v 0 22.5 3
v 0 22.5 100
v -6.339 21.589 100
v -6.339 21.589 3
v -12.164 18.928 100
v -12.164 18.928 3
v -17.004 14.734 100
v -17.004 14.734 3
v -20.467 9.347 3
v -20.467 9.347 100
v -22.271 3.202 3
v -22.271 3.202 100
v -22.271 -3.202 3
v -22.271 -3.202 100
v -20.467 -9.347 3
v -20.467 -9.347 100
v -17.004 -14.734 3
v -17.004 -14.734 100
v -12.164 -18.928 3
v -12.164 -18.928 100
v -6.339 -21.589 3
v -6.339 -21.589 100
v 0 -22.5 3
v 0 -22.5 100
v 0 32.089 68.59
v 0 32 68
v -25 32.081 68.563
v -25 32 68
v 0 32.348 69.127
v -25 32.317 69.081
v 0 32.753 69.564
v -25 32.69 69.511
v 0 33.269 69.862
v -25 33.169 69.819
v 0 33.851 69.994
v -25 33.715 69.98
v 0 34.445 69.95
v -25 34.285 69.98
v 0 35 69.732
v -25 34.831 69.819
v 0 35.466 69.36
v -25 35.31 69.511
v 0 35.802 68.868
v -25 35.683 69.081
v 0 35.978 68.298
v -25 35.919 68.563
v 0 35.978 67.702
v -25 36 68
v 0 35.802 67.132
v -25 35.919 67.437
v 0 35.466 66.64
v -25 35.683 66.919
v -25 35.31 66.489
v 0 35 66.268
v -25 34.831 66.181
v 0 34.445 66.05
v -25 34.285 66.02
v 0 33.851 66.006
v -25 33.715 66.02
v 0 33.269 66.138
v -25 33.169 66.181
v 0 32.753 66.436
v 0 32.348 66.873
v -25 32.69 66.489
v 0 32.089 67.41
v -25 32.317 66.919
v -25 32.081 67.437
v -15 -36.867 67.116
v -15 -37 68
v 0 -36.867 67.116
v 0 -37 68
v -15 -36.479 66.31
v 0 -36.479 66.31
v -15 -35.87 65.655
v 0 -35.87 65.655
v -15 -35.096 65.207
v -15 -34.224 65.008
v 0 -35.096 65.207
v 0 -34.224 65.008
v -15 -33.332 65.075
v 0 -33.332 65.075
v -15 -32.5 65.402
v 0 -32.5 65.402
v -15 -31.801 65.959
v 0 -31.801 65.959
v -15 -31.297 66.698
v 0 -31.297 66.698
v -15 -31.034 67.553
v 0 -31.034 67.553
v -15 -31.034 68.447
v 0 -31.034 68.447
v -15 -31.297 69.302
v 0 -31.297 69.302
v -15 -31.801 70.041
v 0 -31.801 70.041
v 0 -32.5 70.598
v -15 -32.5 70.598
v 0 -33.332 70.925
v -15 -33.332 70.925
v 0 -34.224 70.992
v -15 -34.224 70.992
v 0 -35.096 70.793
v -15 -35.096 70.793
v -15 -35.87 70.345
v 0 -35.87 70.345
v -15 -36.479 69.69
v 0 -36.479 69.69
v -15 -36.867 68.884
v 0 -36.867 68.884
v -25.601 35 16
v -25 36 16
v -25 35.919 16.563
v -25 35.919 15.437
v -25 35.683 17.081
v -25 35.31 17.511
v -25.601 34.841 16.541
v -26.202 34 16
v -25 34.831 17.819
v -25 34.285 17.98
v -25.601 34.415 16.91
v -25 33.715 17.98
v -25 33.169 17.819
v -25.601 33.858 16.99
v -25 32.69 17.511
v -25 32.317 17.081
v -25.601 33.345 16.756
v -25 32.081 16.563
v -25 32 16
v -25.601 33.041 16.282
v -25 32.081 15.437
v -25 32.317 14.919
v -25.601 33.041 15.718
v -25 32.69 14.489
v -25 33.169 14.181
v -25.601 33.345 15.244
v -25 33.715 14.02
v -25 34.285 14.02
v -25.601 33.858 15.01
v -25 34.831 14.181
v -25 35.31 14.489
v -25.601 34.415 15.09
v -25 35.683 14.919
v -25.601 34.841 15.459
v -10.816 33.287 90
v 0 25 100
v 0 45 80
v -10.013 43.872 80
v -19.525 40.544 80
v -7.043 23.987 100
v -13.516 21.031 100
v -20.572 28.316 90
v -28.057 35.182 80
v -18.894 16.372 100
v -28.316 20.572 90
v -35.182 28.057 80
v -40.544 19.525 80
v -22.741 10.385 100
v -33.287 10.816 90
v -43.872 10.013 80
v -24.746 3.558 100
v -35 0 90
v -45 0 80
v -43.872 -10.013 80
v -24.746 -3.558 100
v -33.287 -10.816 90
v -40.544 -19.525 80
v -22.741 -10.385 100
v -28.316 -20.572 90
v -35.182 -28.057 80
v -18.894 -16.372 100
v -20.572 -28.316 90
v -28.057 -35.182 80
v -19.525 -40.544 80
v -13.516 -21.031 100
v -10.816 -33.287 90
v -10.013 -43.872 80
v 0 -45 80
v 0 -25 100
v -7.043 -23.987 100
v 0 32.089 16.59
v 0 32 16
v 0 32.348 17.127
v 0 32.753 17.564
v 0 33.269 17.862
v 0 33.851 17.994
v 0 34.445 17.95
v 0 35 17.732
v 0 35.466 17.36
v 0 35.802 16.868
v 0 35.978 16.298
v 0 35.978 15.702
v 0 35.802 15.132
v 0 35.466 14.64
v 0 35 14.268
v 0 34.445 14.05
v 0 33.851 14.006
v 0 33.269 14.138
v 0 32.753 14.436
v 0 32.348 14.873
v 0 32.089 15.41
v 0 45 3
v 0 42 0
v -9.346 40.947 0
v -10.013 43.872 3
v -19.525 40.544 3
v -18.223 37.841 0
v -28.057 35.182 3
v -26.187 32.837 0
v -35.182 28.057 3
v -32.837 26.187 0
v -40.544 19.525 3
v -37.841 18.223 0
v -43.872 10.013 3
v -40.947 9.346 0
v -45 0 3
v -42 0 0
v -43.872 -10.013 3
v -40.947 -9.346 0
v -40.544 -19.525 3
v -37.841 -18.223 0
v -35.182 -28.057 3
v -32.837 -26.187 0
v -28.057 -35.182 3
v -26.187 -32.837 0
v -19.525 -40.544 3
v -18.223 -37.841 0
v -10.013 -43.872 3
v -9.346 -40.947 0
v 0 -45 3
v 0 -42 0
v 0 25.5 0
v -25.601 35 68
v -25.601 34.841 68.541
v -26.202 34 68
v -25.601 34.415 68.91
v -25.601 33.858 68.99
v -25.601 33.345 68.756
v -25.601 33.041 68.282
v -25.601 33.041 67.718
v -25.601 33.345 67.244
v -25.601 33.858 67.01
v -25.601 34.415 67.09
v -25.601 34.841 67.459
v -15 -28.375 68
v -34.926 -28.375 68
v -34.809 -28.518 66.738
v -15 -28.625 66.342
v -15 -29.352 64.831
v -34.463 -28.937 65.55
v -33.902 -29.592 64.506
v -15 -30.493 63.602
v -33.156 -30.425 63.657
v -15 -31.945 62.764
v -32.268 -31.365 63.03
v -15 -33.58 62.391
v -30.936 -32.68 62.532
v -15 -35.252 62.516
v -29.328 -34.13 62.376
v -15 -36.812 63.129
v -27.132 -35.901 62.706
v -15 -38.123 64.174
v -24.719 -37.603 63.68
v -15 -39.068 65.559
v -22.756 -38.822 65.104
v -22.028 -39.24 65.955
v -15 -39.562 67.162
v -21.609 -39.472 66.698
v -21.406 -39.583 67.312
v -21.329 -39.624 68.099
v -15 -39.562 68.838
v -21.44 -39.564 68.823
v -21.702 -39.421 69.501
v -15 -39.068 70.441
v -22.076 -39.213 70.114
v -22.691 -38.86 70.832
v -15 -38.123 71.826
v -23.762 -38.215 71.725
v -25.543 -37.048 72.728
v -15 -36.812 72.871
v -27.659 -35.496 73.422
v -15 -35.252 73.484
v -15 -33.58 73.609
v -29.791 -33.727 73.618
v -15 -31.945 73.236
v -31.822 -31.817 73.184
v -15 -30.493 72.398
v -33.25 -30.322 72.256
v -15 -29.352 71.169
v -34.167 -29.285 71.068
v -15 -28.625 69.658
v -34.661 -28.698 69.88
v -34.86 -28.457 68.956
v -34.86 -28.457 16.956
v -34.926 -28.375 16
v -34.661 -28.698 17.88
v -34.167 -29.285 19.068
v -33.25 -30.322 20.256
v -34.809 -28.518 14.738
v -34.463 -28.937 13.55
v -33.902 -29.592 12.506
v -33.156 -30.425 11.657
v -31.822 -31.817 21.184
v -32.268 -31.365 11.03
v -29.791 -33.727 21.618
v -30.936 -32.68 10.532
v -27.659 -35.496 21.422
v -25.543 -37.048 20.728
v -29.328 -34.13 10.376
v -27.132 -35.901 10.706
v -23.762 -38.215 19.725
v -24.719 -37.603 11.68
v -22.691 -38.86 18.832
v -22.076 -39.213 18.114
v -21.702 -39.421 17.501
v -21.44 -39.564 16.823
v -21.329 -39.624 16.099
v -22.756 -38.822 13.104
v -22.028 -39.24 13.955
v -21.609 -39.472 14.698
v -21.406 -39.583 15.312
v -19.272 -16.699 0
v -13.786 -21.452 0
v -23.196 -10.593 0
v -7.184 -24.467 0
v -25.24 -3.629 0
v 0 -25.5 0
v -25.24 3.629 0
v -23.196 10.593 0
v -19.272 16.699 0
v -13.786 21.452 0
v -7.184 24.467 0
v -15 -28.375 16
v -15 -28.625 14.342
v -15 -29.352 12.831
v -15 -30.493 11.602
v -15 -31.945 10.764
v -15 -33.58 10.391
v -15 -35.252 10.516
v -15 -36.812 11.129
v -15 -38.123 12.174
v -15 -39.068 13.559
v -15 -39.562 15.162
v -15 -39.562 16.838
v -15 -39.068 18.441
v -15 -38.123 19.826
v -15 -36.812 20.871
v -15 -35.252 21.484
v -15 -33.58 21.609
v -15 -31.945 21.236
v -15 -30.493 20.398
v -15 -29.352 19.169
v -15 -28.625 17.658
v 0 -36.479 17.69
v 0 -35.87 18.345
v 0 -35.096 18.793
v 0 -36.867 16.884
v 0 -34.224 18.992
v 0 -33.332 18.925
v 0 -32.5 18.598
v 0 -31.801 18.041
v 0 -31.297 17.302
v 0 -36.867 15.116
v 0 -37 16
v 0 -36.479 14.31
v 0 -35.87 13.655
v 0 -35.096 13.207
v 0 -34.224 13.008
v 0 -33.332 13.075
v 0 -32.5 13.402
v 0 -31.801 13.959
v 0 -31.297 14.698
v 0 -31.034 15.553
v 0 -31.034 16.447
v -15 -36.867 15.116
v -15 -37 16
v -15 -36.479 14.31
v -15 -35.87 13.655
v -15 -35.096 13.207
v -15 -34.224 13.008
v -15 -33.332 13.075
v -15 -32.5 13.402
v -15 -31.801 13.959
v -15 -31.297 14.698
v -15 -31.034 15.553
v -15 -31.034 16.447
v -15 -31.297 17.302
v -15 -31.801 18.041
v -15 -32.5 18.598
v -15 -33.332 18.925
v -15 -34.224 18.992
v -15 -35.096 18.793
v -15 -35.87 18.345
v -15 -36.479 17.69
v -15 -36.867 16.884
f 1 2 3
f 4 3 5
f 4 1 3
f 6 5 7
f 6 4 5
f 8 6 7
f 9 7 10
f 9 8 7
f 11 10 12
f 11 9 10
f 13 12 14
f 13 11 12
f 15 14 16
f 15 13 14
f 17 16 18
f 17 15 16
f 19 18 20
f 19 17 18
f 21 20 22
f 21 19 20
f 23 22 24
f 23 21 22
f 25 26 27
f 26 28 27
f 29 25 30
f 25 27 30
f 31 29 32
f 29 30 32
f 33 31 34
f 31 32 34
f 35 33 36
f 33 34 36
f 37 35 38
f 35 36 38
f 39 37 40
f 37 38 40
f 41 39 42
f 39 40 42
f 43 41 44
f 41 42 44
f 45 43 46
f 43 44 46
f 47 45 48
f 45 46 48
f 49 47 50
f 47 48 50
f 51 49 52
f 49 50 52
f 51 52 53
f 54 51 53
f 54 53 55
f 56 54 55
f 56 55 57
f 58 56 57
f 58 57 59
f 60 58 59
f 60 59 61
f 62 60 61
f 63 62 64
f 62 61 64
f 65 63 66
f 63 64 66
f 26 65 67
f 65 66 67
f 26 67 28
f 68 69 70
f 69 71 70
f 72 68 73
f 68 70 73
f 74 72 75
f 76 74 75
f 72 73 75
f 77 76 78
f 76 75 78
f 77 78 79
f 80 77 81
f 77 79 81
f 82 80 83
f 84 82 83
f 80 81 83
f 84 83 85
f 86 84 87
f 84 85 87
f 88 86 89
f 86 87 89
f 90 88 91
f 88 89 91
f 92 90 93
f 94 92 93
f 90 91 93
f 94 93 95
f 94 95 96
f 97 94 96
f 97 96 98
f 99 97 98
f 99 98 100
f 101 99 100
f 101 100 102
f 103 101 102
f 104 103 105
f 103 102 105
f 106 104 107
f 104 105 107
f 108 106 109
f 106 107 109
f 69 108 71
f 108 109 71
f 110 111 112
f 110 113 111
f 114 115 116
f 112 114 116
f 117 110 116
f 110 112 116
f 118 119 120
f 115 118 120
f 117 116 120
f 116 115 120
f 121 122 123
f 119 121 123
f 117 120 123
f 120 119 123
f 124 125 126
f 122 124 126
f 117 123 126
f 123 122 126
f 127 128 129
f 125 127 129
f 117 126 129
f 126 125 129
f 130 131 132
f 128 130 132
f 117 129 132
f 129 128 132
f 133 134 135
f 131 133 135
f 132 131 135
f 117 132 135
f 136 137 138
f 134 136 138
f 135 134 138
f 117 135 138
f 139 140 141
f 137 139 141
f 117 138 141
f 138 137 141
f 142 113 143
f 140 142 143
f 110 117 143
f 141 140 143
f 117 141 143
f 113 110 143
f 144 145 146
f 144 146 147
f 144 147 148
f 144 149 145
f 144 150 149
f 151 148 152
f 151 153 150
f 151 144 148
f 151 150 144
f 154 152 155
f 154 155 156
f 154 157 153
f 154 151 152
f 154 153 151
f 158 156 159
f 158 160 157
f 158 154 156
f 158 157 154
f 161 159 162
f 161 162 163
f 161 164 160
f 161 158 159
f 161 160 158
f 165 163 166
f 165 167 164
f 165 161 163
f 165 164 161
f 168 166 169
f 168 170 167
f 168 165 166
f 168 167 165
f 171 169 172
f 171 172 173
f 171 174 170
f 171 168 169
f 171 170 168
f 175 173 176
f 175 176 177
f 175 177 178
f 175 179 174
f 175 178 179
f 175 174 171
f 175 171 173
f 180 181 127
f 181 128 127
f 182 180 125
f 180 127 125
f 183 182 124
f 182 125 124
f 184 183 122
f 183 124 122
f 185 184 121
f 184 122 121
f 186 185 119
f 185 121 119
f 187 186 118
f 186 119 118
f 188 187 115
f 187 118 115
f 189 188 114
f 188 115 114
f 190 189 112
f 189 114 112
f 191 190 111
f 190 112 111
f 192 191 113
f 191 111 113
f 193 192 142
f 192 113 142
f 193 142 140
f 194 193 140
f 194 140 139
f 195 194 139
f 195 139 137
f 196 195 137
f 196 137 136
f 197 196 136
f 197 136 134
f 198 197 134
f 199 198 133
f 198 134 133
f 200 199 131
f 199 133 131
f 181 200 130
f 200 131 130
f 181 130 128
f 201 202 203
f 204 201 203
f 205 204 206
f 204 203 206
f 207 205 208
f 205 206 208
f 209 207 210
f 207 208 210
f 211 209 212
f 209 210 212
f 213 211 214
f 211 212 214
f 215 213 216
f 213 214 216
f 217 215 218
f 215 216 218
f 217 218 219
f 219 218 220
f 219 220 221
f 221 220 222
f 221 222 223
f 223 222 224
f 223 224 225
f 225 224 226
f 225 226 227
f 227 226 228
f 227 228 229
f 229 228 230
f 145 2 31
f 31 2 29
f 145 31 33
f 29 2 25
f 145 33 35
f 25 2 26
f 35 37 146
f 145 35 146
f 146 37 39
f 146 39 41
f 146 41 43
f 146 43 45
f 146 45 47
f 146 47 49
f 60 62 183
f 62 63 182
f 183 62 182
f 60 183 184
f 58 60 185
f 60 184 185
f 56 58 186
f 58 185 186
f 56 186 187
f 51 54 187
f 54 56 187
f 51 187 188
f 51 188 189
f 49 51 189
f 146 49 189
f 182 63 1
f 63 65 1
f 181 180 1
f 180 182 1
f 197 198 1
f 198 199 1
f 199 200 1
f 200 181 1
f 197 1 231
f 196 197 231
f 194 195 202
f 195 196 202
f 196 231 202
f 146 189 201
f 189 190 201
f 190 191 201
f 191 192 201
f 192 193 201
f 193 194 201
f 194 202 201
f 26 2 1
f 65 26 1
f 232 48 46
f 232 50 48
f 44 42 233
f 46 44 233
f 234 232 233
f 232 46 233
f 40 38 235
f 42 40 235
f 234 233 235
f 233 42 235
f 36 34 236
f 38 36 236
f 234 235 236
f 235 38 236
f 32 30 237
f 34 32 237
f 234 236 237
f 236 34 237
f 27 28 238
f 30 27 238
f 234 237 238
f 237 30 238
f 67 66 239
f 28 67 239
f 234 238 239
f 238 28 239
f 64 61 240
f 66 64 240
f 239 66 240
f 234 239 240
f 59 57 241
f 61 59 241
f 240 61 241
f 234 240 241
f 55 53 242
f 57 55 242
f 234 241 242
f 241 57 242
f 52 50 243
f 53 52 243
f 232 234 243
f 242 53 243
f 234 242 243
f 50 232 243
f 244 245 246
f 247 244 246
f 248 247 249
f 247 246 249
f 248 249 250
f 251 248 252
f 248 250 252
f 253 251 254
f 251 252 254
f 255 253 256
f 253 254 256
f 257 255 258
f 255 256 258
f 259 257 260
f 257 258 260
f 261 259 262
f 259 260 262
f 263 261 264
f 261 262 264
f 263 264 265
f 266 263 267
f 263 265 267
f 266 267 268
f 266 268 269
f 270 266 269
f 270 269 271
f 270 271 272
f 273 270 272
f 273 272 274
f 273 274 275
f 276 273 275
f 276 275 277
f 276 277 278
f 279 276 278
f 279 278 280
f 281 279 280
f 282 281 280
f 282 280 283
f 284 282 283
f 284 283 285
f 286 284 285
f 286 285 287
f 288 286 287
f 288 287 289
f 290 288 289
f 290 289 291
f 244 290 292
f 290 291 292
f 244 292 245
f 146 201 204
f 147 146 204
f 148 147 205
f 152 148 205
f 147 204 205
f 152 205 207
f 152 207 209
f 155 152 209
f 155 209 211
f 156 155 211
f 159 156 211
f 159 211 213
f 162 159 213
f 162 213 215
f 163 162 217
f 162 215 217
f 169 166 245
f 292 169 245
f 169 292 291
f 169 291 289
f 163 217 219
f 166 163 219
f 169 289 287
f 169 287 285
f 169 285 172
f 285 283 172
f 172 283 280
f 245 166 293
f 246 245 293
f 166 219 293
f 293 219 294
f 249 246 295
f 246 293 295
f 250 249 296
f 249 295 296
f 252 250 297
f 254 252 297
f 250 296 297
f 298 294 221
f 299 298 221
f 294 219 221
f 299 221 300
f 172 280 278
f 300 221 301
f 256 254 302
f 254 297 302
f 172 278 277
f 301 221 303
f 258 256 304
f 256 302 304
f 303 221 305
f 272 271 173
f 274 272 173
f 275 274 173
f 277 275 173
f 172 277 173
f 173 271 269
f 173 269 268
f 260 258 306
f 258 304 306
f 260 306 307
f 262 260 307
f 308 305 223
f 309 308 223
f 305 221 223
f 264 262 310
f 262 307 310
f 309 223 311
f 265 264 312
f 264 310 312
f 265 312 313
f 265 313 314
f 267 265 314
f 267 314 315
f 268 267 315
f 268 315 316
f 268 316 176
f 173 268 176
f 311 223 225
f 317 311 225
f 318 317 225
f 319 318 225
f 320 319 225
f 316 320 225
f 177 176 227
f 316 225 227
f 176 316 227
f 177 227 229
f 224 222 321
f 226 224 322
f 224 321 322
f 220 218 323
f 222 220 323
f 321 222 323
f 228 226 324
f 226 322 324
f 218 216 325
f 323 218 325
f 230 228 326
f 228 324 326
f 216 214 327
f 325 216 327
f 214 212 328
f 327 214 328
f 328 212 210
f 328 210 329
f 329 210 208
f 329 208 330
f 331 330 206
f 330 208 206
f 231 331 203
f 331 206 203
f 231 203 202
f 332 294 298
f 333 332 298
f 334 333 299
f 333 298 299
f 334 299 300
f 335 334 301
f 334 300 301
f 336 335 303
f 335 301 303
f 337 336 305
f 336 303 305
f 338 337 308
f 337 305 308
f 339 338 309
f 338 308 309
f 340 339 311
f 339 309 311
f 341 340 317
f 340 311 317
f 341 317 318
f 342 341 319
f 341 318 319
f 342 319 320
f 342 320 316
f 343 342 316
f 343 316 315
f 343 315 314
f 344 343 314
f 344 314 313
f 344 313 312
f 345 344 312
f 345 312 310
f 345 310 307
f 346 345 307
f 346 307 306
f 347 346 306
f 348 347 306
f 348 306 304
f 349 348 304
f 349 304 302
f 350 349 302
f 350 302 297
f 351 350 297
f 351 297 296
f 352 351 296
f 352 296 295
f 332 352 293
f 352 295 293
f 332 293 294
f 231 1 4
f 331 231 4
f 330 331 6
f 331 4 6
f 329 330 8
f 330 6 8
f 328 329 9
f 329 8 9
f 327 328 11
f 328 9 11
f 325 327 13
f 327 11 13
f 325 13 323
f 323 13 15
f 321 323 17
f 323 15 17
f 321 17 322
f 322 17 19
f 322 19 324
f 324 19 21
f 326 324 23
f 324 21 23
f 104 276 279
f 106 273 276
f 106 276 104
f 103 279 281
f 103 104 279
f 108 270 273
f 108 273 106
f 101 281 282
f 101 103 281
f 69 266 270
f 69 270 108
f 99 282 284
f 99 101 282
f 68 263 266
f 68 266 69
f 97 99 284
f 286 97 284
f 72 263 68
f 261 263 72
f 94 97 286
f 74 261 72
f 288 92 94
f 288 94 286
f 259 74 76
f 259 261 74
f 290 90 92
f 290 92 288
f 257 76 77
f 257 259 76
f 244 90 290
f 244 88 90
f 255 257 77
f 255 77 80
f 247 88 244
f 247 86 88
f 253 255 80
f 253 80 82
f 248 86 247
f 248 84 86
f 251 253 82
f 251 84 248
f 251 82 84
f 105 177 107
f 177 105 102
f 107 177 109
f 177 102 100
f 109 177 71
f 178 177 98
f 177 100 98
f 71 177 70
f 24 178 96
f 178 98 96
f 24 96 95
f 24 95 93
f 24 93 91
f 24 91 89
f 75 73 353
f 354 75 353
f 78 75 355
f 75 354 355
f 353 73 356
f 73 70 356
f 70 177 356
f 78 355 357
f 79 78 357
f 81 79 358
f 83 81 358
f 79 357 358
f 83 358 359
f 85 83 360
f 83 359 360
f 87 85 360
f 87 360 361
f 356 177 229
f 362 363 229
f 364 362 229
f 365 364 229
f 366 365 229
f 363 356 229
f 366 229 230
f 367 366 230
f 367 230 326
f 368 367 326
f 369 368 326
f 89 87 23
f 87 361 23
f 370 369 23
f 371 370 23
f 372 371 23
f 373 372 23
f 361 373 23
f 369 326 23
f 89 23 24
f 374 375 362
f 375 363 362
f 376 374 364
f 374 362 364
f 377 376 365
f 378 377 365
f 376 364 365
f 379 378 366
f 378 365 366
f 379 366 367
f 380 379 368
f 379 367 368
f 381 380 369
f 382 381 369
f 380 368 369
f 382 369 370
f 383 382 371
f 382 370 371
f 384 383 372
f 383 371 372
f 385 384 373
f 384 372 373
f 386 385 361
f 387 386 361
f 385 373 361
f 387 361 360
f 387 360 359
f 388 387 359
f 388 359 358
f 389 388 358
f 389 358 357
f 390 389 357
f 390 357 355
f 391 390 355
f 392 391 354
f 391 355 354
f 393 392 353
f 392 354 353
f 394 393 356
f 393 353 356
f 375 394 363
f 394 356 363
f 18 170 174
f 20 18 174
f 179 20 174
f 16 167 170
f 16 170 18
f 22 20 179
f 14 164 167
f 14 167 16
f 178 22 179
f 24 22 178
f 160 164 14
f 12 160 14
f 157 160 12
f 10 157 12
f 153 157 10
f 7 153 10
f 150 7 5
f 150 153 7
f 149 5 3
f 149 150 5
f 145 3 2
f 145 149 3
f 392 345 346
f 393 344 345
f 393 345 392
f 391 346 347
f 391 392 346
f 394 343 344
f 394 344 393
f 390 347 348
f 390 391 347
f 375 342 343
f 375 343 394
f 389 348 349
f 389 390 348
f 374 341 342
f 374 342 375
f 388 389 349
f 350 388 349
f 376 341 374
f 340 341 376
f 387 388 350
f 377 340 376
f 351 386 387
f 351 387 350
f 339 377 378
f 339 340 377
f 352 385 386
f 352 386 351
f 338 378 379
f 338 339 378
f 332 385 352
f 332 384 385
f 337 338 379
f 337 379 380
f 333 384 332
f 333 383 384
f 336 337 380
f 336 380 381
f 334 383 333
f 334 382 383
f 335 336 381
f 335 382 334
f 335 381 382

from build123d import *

# Parameters (mm, degrees)
F0_R            = 45
F0_R_2          = 22.5
F1_DEPTH        = 100
F2_SIZE         = 20
F3_SIZE         = 3
F4_W            = 48.8546937704
F4_H            = 132.6055675745
F5_DEPTH        = 100
F8_D            = 4
F8_DEPTH        = 25
F8_TIP          = 1.2017212381
F10_D           = 6
F10_CBORE_D     = 11.25
F10_CBORE_DEPTH = 35


with BuildPart() as f1:
    # F0 (on Top) → F1 (new body)
    with BuildSketch(Plane.XY):
        Circle(F0_R)
        Circle(F0_R_2, mode=Mode.SUBTRACT)
    extrude(amount=F1_DEPTH)

    # F2
    f2_edges = [f1.edges().sort_by_distance(p)[0] for p in [
        (-45, 0, 100),
    ]]
    chamfer(f2_edges, length=F2_SIZE)

    # F3
    f3_edges = [f1.edges().sort_by_distance(p)[0] for p in [
        (-45, 0, 0),
        (-22.5, 0, 0),
    ]]
    chamfer(f3_edges, length=F3_SIZE)

    # F4 (on Top) → F5 (cut)
    with BuildSketch(Plane.XY):
        with Locations((24.4273468852, 2.2433325648)):
            Rectangle(F4_W, F4_H)
    extrude(amount=F5_DEPTH, mode=Mode.SUBTRACT)

    # F8
    with Locations(Plane.YZ):
        with Locations((34, 68), (34, 16)):
            Hole(F8_D / 2, depth=F8_DEPTH)
            with Locations((0, 0, -(F8_DEPTH + F8_TIP / 2))):  # 118° drill point
                Cone(0, F8_D / 2, F8_TIP, mode=Mode.SUBTRACT)

    # F10 (through all)
    with Locations(Plane(origin=(-50, 0, 0), x_dir=(0, 1, 0), z_dir=(-1, 0, 0))):
        with Locations((-34, -68), (-34, -16)):
            CounterBoreHole(F10_D / 2, F10_CBORE_D / 2, F10_CBORE_DEPTH)


solid = f1.part
